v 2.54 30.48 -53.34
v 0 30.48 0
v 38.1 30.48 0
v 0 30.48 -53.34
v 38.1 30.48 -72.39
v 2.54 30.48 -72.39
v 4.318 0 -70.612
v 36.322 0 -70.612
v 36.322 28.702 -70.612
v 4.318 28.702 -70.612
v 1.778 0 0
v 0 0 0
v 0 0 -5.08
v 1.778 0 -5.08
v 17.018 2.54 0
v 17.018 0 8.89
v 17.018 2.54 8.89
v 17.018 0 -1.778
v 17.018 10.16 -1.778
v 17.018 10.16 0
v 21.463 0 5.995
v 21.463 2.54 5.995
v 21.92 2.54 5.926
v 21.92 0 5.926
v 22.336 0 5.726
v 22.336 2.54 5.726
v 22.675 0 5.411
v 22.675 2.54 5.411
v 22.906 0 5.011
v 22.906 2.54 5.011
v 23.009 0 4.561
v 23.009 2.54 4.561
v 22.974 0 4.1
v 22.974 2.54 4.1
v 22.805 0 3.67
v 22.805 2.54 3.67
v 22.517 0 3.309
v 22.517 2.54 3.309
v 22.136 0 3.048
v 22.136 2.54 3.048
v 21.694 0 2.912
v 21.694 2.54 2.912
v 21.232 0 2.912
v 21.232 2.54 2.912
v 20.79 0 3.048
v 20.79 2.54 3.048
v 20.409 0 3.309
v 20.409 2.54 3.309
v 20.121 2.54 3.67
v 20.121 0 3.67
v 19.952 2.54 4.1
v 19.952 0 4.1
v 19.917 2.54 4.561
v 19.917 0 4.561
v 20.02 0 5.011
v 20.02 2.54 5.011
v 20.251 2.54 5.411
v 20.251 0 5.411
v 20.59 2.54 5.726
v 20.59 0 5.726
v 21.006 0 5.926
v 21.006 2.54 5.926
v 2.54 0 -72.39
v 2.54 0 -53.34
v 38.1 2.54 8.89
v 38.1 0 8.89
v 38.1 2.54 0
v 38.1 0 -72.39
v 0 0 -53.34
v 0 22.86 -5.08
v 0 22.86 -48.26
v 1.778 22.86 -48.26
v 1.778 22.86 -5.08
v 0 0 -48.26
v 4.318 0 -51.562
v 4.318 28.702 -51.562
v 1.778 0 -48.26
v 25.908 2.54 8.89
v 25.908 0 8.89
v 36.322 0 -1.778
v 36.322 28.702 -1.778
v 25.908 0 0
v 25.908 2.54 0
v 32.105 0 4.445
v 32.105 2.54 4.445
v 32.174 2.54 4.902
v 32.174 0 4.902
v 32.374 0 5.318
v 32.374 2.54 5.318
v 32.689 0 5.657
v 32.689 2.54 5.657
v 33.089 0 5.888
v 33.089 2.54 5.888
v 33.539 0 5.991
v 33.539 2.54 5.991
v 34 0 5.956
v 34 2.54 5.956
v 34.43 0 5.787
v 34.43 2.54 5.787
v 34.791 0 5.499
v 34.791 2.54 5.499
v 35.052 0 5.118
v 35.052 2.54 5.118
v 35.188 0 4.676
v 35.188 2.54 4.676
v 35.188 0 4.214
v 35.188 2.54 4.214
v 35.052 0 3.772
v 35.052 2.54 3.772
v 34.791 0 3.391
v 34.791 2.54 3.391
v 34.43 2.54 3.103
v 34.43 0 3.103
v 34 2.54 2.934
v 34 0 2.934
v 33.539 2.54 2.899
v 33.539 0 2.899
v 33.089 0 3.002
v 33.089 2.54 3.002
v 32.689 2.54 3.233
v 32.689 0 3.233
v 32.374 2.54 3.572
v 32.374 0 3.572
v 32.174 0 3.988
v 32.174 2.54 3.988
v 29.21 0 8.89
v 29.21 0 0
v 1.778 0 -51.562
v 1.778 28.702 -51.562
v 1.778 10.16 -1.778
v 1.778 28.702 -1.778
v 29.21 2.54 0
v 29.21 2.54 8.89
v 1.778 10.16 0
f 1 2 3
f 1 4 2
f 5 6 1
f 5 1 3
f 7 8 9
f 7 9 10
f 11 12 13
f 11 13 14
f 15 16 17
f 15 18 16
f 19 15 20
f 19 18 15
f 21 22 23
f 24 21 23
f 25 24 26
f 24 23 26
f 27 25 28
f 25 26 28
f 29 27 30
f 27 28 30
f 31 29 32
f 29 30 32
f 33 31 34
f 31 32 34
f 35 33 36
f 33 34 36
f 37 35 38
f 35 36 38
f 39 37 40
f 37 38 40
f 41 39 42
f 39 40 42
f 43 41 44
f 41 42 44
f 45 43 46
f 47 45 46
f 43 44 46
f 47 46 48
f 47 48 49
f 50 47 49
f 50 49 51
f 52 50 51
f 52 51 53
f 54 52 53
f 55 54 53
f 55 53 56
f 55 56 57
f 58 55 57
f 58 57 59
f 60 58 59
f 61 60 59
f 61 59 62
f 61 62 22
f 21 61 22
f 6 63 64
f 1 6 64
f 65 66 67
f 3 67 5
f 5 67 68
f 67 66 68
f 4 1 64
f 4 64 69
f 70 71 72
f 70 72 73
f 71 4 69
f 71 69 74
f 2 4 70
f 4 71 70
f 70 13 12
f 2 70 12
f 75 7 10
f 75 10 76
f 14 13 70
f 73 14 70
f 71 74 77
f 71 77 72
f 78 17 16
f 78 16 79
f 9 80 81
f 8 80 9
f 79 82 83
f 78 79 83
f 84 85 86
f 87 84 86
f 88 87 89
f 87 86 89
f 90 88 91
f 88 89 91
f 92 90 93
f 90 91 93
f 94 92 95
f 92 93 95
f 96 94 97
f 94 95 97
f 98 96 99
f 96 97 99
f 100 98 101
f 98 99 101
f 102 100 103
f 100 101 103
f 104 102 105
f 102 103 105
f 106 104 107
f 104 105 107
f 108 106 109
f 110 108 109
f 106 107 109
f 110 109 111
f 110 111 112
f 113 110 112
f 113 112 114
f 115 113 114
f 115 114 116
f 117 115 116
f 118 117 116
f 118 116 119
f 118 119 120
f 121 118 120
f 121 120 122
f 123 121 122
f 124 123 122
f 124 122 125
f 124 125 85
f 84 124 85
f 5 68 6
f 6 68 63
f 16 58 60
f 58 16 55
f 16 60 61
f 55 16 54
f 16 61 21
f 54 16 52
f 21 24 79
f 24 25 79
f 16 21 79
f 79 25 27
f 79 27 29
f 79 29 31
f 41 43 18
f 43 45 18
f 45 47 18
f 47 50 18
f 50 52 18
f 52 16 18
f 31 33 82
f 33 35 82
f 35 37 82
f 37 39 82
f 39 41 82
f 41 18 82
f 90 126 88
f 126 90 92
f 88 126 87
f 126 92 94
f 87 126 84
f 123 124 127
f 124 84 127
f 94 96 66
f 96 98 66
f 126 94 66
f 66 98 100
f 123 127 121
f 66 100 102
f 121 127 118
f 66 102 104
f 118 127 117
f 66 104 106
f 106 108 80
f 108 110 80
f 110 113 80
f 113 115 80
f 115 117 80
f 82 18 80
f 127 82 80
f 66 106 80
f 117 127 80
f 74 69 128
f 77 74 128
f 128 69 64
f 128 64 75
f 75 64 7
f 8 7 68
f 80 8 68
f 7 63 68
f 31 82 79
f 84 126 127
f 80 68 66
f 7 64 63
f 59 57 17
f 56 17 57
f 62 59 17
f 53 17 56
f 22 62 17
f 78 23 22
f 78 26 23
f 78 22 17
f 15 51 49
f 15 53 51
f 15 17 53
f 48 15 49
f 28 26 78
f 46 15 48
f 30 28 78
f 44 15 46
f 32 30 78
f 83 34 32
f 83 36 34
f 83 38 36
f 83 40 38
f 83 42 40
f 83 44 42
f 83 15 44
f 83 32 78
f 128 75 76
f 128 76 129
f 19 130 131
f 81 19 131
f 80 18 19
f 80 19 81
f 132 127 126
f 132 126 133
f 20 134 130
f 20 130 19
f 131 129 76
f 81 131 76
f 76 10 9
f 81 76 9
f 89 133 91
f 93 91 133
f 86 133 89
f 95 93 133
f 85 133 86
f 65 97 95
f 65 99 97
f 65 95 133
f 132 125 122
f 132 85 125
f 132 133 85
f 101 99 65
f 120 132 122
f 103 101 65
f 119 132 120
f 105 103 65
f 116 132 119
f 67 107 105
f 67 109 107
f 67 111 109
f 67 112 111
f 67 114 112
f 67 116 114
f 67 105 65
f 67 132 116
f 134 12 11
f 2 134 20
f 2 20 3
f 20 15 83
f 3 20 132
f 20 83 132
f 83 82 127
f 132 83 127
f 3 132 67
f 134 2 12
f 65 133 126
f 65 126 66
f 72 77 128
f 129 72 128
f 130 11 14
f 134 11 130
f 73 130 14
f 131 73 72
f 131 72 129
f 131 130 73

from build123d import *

# Parameters (mm, degrees)
BOSS_EXTRUDE1_DEPTH = 30.48
SHELL1_T            = -1.778
CUT_EXTRUDE3_REACH  = 89.298
SKETCH7_W           = 15.24
SKETCH7_H           = 10.16
SKETCH2_W           = 8.89
SKETCH2_H           = 2.54
BOSS_EXTRUDE2_DEPTH = 8.89
SKETCH3_R           = 1.55
CUT_EXTRUDE1_DEPTH  = 87.444003262
SKETCH4_R           = 1.55
CUT_EXTRUDE2_DEPTH  = 87.444003262
SKETCH8_W           = 43.18
SKETCH8_H           = 22.86
CUT_EXTRUDE4_DEPTH  = 11.684


with BuildPart() as part:
    # Sketch1 → Boss-Extrude1 (new body)
    with BuildSketch(Plane(origin=(0, 0, 0), x_dir=(1, 0, 0), z_dir=(0, 1, 0))):
        Polygon((0, 0), (38.1, 0), (38.1, 53.34), (38.1, 72.39), (2.54, 72.39), (2.54, 53.34), (0, 53.34), align=None)
    extrude(amount=BOSS_EXTRUDE1_DEPTH)

    # Shell1
    shell1_openings = [part.faces().sort_by_distance(p)[0] for p in [
        (19.3675, 0, -35.71875),
    ]]
    offset(amount=SHELL1_T, openings=shell1_openings, kind=Kind.INTERSECTION)

    # Sketch7 → Cut-Extrude3 (cut, up to next)
    with BuildSketch(Plane.XY, mode=Mode.PRIVATE) as cut_extrude3_sk1:
        with Locations((9.398, 5.08)):
            Rectangle(SKETCH7_W, SKETCH7_H)
    cut_extrude3_tool1 = extrude(cut_extrude3_sk1.sketch, amount=-CUT_EXTRUDE3_REACH, mode=Mode.PRIVATE) & part.part
    add(cut_extrude3_tool1.solids().sort_by_distance((9.398, 5.08, 0))[0], mode=Mode.SUBTRACT)

    # Sketch2 → Boss-Extrude2 (add)
    with BuildSketch(Plane.XY):
        with Locations((21.463, 1.27)):
            Rectangle(SKETCH2_W, SKETCH2_H)
        with Locations((33.655, 1.27)):
            Rectangle(SKETCH2_W, SKETCH2_H)
    extrude(amount=BOSS_EXTRUDE2_DEPTH)

    # Sketch3 → Cut-Extrude1 (cut, through all)
    with BuildSketch(Plane(origin=(0, 2.54, 0), x_dir=(1, 0, 0), z_dir=(0, 1, 0))):
        with Locations(Location((21.463, -4.445, 0), (0, 0, 270))):
            Circle(SKETCH3_R)
    extrude(amount=-CUT_EXTRUDE1_DEPTH, mode=Mode.SUBTRACT)

    # Sketch4 → Cut-Extrude2 (cut, through all)
    with BuildSketch(Plane(origin=(0, 2.54, 0), x_dir=(1, 0, 0), z_dir=(0, 1, 0))):
        with Locations(Location((33.655, -4.445, 0), (0, 0, 180))):
            Circle(SKETCH4_R)
    extrude(amount=-CUT_EXTRUDE2_DEPTH, mode=Mode.SUBTRACT)

    # Sketch8 → Cut-Extrude4 (cut)
    with BuildSketch(Plane.ZY):
        with Locations((-26.67, 11.43)):
            Rectangle(SKETCH8_W, SKETCH8_H)
    extrude(amount=-CUT_EXTRUDE4_DEPTH, mode=Mode.SUBTRACT)


solid = part.part
